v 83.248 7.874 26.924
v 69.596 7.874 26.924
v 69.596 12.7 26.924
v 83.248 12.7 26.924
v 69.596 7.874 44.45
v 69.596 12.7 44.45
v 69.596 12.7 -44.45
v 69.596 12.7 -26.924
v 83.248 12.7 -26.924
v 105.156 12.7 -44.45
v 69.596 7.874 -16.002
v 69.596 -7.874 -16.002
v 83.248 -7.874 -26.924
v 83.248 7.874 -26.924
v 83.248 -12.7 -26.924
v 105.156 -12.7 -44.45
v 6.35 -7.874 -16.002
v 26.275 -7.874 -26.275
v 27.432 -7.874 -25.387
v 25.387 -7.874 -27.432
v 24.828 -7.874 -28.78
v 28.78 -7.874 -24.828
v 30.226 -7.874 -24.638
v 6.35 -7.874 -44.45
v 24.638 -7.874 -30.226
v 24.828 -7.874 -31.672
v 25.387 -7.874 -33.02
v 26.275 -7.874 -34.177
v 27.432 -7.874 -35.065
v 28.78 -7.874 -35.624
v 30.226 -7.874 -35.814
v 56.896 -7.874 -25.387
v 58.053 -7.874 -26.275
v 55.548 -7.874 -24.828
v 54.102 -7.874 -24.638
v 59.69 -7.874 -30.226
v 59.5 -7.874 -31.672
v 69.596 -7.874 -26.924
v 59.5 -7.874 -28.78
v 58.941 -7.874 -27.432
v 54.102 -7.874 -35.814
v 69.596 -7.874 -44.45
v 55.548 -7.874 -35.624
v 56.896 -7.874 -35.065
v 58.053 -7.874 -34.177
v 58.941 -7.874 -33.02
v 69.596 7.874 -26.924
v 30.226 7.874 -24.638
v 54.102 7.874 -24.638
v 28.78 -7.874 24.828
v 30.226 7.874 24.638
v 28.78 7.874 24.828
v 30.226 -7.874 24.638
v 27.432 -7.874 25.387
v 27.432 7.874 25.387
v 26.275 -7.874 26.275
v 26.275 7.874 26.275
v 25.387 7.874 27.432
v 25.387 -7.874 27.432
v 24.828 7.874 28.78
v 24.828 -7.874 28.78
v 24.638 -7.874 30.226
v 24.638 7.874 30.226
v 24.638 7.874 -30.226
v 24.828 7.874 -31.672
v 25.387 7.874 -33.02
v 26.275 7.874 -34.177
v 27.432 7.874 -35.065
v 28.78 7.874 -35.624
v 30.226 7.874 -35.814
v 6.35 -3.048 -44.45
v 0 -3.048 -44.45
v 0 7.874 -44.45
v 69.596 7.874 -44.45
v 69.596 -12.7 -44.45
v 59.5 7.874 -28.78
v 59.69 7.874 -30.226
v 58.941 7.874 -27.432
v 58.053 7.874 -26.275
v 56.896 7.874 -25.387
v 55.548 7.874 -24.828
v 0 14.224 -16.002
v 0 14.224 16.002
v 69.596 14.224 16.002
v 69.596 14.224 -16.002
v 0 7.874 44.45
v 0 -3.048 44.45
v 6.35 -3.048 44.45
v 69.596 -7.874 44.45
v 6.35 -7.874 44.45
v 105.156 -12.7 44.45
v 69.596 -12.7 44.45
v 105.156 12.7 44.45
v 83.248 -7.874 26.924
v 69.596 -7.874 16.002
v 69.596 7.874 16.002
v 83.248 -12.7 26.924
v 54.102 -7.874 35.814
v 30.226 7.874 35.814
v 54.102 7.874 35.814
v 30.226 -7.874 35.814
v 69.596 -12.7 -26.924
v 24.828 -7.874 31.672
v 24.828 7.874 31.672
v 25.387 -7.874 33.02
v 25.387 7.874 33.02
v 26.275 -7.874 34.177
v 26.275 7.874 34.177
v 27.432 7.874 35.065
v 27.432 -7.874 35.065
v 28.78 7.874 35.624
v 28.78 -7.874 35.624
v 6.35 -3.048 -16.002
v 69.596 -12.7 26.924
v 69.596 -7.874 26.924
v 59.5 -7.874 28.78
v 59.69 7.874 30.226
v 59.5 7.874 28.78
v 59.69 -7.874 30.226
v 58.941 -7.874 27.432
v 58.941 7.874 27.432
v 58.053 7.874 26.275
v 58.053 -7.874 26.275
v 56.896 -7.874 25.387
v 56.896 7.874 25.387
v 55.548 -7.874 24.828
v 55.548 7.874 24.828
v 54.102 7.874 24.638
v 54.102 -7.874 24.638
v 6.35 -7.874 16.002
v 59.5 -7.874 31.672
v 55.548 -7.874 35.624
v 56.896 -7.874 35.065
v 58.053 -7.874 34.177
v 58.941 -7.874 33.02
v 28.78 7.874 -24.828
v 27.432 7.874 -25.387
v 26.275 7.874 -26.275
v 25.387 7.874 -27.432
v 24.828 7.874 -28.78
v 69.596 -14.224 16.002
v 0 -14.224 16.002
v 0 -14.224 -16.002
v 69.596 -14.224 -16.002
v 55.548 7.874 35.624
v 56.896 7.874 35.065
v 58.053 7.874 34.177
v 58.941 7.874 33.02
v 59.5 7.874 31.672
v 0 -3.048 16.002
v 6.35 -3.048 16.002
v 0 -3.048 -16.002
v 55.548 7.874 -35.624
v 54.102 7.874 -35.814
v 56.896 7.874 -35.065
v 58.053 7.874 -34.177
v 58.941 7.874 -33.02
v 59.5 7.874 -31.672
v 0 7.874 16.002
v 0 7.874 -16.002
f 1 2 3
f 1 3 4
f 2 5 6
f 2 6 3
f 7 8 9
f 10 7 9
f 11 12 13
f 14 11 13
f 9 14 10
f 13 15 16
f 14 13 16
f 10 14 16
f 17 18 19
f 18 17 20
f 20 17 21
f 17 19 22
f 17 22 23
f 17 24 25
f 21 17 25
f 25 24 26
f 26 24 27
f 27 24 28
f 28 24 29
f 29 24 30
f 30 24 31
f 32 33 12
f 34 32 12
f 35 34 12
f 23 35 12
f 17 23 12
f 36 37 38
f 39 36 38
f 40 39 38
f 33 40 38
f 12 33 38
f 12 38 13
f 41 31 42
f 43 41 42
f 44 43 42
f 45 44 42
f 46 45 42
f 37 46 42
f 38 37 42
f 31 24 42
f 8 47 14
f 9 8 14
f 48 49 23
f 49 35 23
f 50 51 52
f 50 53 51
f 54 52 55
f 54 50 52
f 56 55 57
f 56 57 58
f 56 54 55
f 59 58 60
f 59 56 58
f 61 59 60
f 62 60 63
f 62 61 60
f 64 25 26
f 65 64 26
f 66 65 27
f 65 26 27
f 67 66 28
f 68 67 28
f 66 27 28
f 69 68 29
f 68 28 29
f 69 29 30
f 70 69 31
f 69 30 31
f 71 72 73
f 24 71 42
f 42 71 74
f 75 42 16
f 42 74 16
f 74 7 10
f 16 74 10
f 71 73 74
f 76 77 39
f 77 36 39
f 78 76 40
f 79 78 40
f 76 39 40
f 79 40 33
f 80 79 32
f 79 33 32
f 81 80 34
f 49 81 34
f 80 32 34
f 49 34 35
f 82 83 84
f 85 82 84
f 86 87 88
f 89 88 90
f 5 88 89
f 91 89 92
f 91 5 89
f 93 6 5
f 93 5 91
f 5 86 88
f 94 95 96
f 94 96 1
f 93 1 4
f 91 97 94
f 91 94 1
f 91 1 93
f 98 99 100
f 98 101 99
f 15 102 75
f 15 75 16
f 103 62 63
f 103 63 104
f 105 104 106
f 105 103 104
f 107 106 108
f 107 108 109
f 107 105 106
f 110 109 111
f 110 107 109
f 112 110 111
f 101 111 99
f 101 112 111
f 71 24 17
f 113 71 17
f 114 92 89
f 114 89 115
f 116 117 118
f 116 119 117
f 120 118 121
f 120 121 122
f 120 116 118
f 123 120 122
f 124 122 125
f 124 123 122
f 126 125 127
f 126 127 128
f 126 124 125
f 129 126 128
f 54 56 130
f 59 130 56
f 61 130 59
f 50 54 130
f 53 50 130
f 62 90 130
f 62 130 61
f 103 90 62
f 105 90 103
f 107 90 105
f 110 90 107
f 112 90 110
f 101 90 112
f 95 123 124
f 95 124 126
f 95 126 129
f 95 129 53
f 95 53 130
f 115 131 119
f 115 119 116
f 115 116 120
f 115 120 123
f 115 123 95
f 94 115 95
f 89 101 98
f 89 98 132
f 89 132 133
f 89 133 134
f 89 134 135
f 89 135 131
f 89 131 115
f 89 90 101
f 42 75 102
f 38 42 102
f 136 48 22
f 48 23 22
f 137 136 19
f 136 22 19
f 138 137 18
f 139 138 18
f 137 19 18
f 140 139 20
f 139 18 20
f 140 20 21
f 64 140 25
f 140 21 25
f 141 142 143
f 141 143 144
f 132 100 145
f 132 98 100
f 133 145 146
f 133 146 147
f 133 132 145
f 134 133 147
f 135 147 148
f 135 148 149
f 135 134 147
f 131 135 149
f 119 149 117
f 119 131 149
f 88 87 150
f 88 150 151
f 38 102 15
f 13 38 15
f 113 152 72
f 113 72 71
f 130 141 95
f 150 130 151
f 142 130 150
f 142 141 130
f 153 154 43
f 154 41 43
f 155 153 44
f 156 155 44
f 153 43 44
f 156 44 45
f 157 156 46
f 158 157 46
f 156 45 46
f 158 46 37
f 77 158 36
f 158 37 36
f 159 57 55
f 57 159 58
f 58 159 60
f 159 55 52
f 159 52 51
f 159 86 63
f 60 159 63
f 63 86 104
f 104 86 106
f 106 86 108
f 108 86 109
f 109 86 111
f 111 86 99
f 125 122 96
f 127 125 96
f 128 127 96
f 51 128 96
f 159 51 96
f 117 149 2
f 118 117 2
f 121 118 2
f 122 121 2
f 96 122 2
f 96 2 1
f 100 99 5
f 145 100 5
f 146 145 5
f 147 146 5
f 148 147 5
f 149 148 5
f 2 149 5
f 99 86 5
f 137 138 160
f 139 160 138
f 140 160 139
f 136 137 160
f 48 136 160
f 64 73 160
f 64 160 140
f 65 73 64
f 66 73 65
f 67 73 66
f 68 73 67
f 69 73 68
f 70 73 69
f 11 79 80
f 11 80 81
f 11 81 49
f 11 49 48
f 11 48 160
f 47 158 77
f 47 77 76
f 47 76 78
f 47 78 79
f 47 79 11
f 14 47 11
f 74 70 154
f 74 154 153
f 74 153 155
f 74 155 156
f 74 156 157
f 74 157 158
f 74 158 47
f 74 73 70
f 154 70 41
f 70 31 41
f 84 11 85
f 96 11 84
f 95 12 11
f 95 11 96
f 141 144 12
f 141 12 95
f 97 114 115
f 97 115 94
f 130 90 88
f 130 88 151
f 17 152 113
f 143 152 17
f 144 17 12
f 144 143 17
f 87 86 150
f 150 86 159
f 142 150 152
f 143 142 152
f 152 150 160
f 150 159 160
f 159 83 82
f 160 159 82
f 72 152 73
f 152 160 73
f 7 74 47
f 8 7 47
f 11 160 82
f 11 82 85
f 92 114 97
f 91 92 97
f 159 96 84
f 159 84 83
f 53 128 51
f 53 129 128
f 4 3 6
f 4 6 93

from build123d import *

# Parameters (mm, degrees)
F1_DEPTH = 7.874
F2_DEPTH = 14.224
F3_DEPTH = 12.7
F0_W     = 6.35
F0_H     = 28.448
F4_DEPTH = 7.874
F5_DEPTH = 3.048


with BuildPart() as f1:
    # F0 (on Front) → F1 (new body, symmetric)
    with BuildSketch(Plane.XZ):
        Polygon((6.35, 44.45), (6.35, 16.002), (69.596, 16.002), (83.2485, 26.924), (69.596, 26.924), (69.596, 44.45), align=None)
        with BuildLine():
            ThreePointArc((24.638, 30.226), (26.274687, 34.177313), (30.226, 35.814))
            Line((30.226, 35.814), (54.102, 35.814))
            ThreePointArc((54.102, 35.814), (58.053313, 34.177313), (59.69, 30.226))
            ThreePointArc((59.69, 30.226), (58.053313, 26.274687), (54.102, 24.638))
            Line((54.102, 24.638), (30.226, 24.638))
            ThreePointArc((30.226, 24.638), (26.274687, 26.274687), (24.638, 30.226))
        make_face(mode=Mode.SUBTRACT)
    extrude(amount=F1_DEPTH, both=True)

    # F0 (on Front) → F2 (join, symmetric)
    with BuildSketch(Plane.XZ):
        Polygon((0, 16.002), (0, 0), (0, -16.002), (6.35, -16.002), (69.596, -16.002), (69.596, 0), (69.596, 16.002), (6.35, 16.002), align=None)
    extrude(amount=F2_DEPTH, both=True)

    # F0 (on Front) → F3 (join, symmetric)
    with BuildSketch(Plane.XZ):
        Polygon((69.596, 26.924), (83.2485, 26.924), (105.156, 44.45), (69.596, 44.45), align=None)
    extrude(amount=F3_DEPTH, both=True)

    # F0 (on Front) → F4 (join)
    with BuildSketch(Plane.XZ):
        with Locations((3.175, 30.226)):
            Rectangle(F0_W, F0_H)
    extrude(amount=-F4_DEPTH)

    # F0 (on Front) → F5 (join)
    with BuildSketch(Plane.XZ):
        with Locations((3.175, 30.226)):
            Rectangle(F0_W, F0_H)
    extrude(amount=F5_DEPTH)

    # F6: F1 across plane


with BuildPart() as f1_1:
    add(f1.part)
    add(f1.part.mirror(Plane.XY))


solid = f1_1.part
